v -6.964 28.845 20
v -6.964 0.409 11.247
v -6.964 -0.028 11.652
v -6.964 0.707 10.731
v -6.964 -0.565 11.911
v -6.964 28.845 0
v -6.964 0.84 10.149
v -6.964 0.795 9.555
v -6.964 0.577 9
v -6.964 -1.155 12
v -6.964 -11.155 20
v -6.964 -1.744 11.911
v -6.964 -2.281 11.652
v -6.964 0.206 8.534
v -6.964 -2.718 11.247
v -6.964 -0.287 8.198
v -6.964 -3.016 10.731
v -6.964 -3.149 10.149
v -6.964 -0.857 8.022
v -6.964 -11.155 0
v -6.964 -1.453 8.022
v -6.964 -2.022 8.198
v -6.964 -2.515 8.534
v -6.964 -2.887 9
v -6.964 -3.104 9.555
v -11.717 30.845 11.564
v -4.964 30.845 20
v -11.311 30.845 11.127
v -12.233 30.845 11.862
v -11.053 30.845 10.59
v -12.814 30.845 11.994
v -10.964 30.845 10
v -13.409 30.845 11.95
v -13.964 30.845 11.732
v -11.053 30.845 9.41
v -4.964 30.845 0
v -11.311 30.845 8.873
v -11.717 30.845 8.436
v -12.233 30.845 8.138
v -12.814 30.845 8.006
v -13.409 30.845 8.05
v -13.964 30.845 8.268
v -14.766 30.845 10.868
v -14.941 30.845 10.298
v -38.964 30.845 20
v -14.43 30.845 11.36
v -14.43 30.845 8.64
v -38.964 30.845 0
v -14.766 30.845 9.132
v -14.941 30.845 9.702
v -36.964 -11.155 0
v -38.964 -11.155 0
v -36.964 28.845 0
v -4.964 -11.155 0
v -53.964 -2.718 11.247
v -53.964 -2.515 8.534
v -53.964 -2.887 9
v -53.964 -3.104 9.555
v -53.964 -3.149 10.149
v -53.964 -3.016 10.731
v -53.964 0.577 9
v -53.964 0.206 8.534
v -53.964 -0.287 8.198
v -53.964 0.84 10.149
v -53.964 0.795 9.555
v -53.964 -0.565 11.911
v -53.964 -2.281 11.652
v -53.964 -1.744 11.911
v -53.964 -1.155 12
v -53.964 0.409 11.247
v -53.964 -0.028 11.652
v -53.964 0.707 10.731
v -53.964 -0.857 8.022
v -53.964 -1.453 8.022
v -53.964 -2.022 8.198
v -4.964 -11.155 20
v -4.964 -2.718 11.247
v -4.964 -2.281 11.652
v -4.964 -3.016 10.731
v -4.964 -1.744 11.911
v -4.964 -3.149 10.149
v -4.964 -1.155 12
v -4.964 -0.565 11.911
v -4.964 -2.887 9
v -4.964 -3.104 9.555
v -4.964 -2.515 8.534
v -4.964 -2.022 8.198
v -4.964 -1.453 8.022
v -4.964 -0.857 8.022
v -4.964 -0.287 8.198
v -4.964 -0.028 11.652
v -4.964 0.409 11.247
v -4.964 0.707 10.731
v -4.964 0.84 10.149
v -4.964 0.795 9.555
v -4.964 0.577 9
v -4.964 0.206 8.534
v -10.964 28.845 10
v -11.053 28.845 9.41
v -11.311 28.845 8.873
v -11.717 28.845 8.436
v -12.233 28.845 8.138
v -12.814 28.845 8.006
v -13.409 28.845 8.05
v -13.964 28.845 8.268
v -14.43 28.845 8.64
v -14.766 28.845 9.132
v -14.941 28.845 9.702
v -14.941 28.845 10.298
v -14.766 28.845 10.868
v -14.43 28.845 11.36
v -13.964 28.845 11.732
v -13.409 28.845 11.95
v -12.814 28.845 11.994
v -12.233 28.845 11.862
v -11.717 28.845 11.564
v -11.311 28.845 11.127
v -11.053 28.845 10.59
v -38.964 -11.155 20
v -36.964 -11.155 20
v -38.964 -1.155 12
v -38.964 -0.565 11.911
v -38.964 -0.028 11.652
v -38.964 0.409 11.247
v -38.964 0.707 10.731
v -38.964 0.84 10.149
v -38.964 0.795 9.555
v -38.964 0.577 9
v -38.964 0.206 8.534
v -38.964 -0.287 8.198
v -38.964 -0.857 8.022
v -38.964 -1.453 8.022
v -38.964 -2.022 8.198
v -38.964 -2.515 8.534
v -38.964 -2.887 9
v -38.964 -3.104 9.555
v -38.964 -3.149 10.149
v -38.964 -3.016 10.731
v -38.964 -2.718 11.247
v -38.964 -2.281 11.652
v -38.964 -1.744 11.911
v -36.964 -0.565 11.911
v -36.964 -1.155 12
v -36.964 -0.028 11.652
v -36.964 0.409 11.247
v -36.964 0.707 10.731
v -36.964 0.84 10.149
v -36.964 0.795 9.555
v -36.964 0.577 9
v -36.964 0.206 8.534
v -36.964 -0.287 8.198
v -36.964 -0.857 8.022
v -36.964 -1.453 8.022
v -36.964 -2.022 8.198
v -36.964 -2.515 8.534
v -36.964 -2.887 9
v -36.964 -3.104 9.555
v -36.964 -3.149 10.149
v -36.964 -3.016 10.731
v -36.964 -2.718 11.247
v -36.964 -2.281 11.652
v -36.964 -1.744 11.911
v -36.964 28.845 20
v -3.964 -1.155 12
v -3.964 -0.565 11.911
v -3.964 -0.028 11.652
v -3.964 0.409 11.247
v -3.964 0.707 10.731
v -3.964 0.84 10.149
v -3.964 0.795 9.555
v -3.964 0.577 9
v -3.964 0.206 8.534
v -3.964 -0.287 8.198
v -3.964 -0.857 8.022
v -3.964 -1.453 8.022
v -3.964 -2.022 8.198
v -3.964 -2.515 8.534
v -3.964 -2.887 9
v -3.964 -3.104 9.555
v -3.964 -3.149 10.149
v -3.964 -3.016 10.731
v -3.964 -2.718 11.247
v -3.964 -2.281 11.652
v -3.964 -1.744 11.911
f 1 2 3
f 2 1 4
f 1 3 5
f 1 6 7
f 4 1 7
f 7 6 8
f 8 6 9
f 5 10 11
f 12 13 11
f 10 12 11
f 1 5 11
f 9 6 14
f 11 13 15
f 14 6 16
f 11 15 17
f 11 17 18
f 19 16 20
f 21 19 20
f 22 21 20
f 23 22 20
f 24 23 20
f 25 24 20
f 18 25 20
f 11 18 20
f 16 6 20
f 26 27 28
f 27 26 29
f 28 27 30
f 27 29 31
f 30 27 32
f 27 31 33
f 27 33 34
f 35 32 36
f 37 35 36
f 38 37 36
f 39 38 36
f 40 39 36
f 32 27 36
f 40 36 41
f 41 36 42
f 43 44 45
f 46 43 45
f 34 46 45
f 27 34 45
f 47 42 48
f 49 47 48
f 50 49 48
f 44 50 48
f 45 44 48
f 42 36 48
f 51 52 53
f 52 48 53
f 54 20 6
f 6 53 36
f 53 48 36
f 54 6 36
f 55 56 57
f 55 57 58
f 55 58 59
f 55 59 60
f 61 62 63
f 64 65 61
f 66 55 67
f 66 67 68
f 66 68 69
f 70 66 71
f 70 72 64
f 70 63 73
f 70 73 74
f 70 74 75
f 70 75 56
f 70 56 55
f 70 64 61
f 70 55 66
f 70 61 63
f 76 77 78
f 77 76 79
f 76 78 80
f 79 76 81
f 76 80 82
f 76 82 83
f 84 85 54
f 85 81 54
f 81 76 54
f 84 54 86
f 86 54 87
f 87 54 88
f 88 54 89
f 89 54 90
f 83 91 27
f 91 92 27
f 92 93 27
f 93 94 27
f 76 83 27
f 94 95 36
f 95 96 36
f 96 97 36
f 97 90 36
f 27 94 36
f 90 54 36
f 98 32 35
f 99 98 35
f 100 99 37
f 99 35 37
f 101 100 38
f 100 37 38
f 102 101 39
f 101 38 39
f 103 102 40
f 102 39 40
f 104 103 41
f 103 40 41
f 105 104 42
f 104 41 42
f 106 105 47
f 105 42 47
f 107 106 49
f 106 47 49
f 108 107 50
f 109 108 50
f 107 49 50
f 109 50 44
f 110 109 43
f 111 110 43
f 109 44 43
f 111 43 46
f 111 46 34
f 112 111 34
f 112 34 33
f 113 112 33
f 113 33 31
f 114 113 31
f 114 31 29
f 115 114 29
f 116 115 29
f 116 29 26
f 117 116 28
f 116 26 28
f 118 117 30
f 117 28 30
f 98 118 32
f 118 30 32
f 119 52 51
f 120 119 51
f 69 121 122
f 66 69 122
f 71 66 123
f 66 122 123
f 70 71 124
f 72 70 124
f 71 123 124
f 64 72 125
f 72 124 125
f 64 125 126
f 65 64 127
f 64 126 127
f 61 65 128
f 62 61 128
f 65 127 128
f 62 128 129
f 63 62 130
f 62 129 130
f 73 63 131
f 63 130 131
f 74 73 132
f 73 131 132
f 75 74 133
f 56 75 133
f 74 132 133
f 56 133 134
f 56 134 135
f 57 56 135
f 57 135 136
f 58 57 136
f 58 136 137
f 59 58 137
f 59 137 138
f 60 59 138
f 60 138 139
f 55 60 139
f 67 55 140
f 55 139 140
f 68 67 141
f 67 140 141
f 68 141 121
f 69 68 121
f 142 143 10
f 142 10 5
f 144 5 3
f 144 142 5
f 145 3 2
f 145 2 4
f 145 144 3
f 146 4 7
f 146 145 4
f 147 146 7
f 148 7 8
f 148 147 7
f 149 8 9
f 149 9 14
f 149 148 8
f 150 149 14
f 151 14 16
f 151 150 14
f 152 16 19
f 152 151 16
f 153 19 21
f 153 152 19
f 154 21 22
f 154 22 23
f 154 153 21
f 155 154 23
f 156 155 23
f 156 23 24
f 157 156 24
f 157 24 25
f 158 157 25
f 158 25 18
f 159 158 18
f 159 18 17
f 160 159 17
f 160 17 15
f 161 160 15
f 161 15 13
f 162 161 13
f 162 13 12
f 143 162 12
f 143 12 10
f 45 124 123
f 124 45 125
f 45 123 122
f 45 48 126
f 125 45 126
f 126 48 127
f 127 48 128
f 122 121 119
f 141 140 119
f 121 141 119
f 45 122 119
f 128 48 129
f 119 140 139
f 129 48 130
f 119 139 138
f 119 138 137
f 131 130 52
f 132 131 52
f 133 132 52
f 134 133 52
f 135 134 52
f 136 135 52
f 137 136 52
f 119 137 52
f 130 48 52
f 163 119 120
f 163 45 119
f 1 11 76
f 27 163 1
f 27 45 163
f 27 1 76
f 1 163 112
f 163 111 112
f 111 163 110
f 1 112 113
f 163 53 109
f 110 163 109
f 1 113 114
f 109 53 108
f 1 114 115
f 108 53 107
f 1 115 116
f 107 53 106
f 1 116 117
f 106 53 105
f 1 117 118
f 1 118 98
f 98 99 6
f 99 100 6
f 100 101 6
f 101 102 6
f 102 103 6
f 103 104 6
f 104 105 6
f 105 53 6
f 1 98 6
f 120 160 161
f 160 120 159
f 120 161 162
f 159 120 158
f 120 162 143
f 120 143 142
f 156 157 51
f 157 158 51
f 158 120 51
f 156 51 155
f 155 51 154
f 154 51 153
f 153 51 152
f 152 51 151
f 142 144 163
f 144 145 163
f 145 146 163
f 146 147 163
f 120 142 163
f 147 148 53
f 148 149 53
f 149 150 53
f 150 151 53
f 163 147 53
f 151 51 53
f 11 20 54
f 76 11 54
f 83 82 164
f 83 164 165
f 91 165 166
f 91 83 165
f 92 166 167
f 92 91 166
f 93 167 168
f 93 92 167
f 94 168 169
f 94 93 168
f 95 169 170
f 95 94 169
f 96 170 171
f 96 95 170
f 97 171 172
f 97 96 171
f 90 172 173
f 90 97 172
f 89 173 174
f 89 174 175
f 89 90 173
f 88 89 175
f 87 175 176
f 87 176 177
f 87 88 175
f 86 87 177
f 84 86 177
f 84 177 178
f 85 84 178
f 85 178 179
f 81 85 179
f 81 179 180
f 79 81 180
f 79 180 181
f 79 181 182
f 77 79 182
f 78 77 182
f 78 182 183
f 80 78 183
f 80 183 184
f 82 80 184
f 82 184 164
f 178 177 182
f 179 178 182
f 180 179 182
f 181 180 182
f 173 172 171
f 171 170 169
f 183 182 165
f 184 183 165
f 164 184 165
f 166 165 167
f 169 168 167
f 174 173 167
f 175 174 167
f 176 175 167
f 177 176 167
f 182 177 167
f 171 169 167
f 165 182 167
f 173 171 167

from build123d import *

# Parameters (mm, degrees)
EXTRUDE_1_DEPTH      = 20
SKETCH_3_R           = 2
EXTRUDE_2_DEPTH      = 15
EXTRUDE_2_DEPTH_BACK = 35
SKETCH_4_R           = 2
CUT_EXTRUDE_1_DEPTH  = 2


with BuildPart() as part:
    # 草图1 → 凸台-拉伸1 (new body)
    with BuildSketch(Plane.XY):
        Polygon((-38.9636651, 28.845358616), (-38.9636651, -11.154641384), (-36.9636651, -11.154641384), (-36.9636651, 28.845358616), (-6.9636651, 28.845358616), (-6.9636651, -11.154641384), (-4.9636651, -11.154641384), (-4.9636651, 30.845358616), (-38.9636651, 30.845358616), align=None)
    extrude(amount=EXTRUDE_1_DEPTH)

    # 草图3 → 凸台-拉伸2 (add, two sides)
    with BuildSketch(Plane.ZY.offset(38.9636651)) as extrude_2_sk:
        with Locations((10, -1.154641384)):
            Circle(SKETCH_3_R)
    extrude(amount=EXTRUDE_2_DEPTH)
    extrude(extrude_2_sk.sketch, amount=-EXTRUDE_2_DEPTH_BACK)

    # 草图4 → 切除-拉伸1 (cut)
    with BuildSketch(Plane(origin=(0, 30.845358616, 0), x_dir=(1, 0, 0), z_dir=(0, 1, 0))):
        with Locations((-12.9636651, -10)):
            Circle(SKETCH_4_R)
    extrude(amount=-CUT_EXTRUDE_1_DEPTH, mode=Mode.SUBTRACT)


solid = part.part
